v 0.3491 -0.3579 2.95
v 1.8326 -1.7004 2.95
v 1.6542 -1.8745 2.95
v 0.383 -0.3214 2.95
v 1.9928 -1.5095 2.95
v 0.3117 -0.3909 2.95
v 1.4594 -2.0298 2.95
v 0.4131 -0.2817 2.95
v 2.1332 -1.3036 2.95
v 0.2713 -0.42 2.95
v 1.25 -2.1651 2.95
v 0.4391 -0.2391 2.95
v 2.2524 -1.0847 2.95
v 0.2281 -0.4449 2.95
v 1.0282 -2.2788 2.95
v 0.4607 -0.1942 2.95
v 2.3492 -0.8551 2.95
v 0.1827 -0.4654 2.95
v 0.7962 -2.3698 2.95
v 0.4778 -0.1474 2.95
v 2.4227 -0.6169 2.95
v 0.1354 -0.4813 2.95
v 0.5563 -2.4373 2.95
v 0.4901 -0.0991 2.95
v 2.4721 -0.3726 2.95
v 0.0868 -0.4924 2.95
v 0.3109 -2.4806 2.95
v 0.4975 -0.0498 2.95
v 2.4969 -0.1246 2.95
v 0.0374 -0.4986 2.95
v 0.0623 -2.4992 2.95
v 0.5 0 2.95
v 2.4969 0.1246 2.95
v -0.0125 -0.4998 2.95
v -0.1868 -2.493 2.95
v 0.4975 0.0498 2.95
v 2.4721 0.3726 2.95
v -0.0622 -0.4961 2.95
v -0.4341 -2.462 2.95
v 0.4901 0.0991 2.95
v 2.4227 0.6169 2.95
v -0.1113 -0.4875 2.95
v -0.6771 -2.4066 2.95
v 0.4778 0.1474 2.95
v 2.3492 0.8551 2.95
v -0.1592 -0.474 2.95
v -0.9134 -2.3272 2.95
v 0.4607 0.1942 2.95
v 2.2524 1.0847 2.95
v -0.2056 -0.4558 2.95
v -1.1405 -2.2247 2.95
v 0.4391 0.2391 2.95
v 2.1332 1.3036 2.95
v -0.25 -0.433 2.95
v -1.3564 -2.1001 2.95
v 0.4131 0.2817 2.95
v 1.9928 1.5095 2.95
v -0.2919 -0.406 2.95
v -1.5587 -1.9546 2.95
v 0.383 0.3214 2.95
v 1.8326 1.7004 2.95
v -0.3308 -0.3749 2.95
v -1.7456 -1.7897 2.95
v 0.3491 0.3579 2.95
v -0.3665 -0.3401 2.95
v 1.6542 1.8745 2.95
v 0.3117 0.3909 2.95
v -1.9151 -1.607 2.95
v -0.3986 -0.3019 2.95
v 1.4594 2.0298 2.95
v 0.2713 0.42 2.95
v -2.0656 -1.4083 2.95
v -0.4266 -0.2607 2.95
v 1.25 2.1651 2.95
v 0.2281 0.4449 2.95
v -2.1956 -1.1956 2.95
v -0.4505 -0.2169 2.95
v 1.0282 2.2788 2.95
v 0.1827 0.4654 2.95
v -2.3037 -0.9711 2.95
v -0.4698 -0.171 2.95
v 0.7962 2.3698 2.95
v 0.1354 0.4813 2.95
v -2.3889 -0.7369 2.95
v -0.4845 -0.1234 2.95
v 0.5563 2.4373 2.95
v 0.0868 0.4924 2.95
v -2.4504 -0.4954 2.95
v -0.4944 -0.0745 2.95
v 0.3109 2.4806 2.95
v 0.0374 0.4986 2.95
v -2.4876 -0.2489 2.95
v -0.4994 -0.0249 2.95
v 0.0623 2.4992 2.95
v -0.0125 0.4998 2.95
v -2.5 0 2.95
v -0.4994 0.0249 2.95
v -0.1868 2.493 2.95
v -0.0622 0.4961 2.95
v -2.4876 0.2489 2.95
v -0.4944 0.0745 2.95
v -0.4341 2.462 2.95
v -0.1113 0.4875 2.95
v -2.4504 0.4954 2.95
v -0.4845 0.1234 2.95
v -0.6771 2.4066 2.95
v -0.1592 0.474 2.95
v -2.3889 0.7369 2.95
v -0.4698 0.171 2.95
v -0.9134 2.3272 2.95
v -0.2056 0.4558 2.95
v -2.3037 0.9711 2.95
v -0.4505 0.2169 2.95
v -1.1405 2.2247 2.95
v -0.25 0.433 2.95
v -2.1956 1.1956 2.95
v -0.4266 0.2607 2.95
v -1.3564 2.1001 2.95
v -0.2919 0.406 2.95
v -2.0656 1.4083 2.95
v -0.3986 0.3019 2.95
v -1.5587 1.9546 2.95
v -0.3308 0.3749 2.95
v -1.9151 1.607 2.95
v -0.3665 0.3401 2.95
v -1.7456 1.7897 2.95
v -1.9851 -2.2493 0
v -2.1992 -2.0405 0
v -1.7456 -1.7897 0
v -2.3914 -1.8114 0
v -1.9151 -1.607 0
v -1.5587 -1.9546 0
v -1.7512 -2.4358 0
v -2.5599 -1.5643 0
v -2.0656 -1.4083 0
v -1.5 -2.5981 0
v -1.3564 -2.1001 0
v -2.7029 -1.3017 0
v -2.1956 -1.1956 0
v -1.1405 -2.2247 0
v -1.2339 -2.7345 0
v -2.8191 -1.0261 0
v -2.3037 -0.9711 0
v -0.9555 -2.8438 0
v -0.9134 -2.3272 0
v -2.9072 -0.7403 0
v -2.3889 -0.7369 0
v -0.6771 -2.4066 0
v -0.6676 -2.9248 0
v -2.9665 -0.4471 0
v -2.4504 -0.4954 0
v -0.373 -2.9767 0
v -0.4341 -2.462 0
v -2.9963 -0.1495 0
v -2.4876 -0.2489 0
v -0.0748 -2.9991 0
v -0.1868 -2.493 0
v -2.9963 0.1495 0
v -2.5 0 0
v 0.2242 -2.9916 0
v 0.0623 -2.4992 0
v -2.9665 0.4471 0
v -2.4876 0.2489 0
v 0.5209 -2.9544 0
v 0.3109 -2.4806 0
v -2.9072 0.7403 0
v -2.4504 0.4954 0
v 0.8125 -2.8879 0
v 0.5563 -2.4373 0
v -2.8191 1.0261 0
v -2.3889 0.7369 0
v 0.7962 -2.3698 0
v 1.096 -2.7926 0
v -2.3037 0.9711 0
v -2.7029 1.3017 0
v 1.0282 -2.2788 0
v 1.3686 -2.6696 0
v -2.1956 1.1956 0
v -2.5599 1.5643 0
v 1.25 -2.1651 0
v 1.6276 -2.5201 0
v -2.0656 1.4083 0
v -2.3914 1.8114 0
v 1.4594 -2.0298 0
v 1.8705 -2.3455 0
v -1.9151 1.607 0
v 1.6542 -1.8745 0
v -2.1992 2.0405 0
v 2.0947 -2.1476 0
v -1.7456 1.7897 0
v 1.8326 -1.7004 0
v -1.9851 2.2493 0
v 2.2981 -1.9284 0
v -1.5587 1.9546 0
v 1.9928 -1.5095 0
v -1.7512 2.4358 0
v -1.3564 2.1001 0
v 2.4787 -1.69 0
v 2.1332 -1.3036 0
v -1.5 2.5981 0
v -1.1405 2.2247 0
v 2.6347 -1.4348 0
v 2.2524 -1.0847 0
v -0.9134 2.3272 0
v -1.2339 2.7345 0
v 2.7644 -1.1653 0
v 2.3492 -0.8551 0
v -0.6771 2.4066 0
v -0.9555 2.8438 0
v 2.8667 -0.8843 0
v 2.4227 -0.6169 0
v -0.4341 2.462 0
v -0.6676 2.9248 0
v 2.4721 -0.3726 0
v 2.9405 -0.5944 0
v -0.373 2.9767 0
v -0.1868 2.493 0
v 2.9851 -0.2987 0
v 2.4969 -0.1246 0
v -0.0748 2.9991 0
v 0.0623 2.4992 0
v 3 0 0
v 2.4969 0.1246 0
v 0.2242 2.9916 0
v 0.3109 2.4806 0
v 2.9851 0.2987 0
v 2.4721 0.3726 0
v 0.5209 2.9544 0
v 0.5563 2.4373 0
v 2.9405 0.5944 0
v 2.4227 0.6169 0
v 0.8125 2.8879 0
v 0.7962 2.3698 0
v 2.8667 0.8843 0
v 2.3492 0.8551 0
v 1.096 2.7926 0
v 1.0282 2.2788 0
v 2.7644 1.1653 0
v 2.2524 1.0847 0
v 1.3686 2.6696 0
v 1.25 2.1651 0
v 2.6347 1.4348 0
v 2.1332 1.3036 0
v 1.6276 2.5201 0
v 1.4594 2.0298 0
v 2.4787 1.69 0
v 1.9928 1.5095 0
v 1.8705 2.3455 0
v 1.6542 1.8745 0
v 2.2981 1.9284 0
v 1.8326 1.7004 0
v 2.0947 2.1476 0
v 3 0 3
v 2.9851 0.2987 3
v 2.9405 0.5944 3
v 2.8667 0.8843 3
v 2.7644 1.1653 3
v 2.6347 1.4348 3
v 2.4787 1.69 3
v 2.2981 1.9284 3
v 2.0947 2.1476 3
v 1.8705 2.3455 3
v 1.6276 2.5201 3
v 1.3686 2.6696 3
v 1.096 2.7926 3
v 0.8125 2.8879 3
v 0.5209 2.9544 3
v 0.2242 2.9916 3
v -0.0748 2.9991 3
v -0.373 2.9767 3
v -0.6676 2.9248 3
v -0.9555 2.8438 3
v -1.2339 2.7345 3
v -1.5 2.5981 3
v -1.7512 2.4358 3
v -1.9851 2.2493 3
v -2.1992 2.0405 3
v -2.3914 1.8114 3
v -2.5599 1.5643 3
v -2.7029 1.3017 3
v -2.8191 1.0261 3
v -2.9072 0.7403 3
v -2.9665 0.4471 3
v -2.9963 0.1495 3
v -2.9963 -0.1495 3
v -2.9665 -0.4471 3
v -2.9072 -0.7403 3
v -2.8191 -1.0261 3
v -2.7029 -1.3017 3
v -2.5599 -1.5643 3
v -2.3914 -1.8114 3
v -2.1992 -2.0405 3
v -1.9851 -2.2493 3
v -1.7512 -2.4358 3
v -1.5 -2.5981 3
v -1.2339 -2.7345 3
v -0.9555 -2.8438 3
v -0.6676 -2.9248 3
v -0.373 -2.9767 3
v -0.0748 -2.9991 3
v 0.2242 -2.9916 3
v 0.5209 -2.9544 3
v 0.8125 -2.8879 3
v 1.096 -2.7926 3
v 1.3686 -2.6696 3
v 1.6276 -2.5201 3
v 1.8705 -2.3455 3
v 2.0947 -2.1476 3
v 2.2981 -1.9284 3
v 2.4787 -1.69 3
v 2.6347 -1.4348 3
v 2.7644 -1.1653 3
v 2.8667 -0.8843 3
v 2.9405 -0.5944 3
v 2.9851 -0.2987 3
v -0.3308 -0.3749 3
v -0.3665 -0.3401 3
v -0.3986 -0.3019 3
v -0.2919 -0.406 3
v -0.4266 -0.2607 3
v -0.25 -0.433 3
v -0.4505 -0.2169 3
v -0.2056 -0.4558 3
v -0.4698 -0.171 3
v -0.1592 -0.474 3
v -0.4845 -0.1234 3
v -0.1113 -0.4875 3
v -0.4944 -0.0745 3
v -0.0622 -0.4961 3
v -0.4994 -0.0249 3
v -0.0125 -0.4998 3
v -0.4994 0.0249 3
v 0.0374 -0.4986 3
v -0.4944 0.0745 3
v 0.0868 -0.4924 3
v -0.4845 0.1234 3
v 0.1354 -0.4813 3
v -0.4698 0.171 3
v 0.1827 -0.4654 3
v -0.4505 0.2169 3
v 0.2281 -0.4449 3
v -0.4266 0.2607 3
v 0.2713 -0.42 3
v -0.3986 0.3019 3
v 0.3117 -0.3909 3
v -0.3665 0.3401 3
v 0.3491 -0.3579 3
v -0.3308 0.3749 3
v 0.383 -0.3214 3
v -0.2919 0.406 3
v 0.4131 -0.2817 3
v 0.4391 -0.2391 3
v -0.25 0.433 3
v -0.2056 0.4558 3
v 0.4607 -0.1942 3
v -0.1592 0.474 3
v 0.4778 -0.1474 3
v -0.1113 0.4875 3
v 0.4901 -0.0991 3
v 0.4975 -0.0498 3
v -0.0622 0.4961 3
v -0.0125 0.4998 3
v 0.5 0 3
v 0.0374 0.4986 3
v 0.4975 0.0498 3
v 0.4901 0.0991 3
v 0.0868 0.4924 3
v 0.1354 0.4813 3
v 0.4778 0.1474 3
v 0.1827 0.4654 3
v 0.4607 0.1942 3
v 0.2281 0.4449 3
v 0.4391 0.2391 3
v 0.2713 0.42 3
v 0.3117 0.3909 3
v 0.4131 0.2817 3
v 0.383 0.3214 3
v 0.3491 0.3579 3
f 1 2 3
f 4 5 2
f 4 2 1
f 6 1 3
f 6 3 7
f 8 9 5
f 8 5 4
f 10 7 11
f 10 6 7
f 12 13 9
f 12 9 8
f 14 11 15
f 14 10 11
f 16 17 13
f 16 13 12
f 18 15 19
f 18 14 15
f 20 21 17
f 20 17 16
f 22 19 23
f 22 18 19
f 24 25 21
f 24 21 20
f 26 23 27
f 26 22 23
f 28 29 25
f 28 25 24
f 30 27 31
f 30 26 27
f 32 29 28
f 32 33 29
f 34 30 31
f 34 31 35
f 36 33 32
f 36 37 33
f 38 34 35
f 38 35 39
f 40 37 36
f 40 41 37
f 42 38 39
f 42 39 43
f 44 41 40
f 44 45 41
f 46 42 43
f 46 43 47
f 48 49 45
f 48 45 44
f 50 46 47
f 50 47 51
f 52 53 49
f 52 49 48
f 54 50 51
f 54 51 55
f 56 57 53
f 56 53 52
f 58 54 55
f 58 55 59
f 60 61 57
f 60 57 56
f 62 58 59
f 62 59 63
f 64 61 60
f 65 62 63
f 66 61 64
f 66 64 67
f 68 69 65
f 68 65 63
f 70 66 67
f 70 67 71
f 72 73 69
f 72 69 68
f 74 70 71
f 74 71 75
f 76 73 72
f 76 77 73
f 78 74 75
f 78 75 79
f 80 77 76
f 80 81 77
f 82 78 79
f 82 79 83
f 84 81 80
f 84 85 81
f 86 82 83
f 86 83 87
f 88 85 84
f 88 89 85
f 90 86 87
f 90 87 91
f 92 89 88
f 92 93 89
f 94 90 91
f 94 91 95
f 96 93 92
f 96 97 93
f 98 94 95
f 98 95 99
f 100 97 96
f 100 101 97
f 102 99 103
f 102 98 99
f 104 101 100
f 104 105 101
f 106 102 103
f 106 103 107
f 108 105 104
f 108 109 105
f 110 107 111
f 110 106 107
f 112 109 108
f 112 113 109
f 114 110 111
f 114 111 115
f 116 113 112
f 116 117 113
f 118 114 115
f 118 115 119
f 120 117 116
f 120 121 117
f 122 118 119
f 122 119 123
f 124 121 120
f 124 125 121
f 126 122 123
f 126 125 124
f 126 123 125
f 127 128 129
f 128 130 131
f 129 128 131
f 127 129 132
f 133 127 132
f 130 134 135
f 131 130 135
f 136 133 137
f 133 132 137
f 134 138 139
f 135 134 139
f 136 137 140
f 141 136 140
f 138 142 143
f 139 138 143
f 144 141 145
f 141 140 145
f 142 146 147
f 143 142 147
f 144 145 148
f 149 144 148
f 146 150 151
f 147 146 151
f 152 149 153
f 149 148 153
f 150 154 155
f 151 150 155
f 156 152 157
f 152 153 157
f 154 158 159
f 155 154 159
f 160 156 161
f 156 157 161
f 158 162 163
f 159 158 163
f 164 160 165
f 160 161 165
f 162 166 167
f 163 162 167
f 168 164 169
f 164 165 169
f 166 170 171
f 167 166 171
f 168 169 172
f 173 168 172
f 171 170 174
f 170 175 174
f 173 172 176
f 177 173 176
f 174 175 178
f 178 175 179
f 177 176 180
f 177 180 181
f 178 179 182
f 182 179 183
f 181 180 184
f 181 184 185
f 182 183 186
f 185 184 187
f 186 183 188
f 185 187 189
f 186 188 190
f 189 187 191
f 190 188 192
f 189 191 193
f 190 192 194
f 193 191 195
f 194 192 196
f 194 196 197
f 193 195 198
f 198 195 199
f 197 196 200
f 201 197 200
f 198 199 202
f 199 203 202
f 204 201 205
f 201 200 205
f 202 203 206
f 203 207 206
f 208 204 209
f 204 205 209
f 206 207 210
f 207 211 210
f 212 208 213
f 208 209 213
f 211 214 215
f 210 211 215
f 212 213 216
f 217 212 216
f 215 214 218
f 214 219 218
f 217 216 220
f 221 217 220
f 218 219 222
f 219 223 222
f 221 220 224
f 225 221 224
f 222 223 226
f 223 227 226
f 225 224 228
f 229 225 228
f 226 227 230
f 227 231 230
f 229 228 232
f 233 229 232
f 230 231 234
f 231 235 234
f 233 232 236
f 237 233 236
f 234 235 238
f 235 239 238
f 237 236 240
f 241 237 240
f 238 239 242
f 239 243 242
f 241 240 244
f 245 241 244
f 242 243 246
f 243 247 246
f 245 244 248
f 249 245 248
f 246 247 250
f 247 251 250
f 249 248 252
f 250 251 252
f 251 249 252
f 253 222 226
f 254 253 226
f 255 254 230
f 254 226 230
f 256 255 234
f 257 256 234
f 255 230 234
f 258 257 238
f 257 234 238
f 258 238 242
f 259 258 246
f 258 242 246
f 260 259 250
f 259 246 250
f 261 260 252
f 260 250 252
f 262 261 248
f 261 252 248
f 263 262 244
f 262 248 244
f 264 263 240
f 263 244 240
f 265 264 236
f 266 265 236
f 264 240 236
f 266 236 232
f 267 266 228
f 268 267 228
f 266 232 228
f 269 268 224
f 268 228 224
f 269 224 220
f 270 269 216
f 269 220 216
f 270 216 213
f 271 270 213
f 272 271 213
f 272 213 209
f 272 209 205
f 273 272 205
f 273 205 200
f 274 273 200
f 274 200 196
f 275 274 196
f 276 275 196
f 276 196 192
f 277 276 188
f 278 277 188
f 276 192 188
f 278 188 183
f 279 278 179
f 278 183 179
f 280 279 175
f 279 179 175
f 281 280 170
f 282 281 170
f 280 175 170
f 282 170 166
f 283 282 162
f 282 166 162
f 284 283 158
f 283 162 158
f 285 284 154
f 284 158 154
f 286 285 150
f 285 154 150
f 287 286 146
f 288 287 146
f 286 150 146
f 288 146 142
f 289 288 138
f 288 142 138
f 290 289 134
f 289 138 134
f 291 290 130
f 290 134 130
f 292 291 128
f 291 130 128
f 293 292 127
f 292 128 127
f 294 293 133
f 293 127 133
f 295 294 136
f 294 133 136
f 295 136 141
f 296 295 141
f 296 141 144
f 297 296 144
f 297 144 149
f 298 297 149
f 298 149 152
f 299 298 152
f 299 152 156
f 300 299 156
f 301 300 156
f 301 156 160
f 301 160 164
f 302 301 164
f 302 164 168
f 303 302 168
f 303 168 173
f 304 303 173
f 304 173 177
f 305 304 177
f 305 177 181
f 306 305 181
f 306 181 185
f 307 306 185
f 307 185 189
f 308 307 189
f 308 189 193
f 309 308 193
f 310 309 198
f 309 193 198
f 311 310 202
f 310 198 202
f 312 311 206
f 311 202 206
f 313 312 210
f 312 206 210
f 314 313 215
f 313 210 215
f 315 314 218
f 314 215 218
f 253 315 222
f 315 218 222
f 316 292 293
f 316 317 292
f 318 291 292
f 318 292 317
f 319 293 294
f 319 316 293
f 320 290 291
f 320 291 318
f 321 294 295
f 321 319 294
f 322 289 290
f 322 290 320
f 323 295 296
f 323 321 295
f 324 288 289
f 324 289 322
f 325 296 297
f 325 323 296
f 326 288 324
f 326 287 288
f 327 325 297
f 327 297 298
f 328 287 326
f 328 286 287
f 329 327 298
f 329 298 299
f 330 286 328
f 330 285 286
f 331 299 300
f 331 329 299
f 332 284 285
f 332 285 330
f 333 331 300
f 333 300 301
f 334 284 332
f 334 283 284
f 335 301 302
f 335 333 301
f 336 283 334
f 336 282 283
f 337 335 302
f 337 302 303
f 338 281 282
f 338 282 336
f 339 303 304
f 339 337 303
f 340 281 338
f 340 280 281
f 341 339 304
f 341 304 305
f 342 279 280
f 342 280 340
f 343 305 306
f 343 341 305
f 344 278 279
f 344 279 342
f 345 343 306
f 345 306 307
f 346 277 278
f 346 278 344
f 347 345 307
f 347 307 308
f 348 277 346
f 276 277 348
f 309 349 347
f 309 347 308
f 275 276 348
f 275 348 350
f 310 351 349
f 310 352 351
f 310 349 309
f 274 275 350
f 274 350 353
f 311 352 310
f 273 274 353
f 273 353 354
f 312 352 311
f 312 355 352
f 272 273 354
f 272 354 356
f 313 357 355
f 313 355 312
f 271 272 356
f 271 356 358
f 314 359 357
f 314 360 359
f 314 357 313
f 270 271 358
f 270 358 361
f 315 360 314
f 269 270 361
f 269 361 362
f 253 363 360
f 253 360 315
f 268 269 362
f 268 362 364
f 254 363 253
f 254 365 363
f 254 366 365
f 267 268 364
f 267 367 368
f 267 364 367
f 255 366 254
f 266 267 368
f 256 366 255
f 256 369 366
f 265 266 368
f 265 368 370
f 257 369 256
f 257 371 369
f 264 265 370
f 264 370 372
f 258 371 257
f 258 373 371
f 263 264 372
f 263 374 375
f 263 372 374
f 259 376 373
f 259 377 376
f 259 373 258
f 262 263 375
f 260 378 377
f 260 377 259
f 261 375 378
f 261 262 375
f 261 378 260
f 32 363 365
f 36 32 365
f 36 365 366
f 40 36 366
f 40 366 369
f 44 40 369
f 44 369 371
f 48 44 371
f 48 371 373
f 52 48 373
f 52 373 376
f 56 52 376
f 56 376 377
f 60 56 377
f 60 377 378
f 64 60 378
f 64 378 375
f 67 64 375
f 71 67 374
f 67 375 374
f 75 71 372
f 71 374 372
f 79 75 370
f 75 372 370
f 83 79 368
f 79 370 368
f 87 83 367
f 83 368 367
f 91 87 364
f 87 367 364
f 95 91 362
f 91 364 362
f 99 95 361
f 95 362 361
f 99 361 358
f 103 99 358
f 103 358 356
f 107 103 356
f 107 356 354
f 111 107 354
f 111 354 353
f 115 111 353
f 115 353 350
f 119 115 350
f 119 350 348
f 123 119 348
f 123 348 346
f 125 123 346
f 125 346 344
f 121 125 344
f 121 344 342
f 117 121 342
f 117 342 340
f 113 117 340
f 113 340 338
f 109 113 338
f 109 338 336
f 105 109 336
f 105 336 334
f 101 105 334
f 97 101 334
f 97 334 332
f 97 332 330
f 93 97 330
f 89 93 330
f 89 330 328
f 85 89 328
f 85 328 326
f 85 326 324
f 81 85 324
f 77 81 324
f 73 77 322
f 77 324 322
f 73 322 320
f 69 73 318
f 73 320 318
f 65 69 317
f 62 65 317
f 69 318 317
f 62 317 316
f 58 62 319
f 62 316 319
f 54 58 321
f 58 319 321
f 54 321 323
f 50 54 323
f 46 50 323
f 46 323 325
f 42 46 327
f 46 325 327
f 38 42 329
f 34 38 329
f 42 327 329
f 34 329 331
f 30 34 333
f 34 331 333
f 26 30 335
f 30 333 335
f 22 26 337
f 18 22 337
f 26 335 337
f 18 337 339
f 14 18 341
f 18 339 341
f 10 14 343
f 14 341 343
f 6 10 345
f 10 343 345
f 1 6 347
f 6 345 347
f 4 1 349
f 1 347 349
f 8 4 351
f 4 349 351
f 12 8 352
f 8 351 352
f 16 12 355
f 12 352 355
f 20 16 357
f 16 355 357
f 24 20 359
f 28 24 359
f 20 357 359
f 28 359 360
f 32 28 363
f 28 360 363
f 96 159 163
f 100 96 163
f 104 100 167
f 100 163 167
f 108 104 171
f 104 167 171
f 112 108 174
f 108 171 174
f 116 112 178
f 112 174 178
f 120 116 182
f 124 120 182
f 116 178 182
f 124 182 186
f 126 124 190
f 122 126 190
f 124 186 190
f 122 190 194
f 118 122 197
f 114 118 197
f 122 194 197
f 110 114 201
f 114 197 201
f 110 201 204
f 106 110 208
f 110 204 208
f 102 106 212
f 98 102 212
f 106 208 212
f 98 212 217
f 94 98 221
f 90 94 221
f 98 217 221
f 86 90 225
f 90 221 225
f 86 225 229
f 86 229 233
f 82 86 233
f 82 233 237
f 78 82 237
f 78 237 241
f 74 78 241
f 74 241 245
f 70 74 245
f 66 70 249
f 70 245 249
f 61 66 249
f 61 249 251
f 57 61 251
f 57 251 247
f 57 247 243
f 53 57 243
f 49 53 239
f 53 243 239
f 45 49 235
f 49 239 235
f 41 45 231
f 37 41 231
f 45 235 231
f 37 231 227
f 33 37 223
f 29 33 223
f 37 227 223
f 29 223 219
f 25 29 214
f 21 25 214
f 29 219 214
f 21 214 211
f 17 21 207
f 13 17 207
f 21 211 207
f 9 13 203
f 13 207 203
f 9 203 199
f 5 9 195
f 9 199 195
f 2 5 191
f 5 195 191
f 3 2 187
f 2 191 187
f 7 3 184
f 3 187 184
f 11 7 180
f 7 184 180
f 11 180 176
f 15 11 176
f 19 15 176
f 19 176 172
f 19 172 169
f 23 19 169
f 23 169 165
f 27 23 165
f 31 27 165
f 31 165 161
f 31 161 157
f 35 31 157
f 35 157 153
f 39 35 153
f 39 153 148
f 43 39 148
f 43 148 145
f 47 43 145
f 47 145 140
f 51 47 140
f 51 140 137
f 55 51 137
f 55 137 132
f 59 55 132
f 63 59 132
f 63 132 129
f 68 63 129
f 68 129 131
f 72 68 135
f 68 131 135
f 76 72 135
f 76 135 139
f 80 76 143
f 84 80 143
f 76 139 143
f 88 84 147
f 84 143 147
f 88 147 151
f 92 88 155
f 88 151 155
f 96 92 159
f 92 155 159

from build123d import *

# Parameters (mm, degrees)
SKETCH1_R           = 3
BOSS_EXTRUDE2_DEPTH = 3
SKETCH2_R           = 2.5
CUT_EXTRUDE2_DEPTH  = 2.95
SKETCH3_R           = 0.5
CUT_EXTRUDE3_DEPTH  = 3


with BuildPart() as part:
    # Sketch1 → Boss-Extrude2 (new body)
    with BuildSketch(Plane.XY):
        Circle(SKETCH1_R)
    extrude(amount=BOSS_EXTRUDE2_DEPTH)

    # Sketch2 → Cut-Extrude2 (cut)
    with BuildSketch(Plane(origin=(0, 0, 0), x_dir=(-1, 0, 0), z_dir=(0, 0, -1))):
        Circle(SKETCH2_R)
    extrude(amount=-CUT_EXTRUDE2_DEPTH, mode=Mode.SUBTRACT)

    # Sketch3 → Cut-Extrude3 (cut)
    with BuildSketch(Plane.XY.offset(3)):
        Circle(SKETCH3_R)
    extrude(amount=-CUT_EXTRUDE3_DEPTH, mode=Mode.SUBTRACT)


solid = part.part
